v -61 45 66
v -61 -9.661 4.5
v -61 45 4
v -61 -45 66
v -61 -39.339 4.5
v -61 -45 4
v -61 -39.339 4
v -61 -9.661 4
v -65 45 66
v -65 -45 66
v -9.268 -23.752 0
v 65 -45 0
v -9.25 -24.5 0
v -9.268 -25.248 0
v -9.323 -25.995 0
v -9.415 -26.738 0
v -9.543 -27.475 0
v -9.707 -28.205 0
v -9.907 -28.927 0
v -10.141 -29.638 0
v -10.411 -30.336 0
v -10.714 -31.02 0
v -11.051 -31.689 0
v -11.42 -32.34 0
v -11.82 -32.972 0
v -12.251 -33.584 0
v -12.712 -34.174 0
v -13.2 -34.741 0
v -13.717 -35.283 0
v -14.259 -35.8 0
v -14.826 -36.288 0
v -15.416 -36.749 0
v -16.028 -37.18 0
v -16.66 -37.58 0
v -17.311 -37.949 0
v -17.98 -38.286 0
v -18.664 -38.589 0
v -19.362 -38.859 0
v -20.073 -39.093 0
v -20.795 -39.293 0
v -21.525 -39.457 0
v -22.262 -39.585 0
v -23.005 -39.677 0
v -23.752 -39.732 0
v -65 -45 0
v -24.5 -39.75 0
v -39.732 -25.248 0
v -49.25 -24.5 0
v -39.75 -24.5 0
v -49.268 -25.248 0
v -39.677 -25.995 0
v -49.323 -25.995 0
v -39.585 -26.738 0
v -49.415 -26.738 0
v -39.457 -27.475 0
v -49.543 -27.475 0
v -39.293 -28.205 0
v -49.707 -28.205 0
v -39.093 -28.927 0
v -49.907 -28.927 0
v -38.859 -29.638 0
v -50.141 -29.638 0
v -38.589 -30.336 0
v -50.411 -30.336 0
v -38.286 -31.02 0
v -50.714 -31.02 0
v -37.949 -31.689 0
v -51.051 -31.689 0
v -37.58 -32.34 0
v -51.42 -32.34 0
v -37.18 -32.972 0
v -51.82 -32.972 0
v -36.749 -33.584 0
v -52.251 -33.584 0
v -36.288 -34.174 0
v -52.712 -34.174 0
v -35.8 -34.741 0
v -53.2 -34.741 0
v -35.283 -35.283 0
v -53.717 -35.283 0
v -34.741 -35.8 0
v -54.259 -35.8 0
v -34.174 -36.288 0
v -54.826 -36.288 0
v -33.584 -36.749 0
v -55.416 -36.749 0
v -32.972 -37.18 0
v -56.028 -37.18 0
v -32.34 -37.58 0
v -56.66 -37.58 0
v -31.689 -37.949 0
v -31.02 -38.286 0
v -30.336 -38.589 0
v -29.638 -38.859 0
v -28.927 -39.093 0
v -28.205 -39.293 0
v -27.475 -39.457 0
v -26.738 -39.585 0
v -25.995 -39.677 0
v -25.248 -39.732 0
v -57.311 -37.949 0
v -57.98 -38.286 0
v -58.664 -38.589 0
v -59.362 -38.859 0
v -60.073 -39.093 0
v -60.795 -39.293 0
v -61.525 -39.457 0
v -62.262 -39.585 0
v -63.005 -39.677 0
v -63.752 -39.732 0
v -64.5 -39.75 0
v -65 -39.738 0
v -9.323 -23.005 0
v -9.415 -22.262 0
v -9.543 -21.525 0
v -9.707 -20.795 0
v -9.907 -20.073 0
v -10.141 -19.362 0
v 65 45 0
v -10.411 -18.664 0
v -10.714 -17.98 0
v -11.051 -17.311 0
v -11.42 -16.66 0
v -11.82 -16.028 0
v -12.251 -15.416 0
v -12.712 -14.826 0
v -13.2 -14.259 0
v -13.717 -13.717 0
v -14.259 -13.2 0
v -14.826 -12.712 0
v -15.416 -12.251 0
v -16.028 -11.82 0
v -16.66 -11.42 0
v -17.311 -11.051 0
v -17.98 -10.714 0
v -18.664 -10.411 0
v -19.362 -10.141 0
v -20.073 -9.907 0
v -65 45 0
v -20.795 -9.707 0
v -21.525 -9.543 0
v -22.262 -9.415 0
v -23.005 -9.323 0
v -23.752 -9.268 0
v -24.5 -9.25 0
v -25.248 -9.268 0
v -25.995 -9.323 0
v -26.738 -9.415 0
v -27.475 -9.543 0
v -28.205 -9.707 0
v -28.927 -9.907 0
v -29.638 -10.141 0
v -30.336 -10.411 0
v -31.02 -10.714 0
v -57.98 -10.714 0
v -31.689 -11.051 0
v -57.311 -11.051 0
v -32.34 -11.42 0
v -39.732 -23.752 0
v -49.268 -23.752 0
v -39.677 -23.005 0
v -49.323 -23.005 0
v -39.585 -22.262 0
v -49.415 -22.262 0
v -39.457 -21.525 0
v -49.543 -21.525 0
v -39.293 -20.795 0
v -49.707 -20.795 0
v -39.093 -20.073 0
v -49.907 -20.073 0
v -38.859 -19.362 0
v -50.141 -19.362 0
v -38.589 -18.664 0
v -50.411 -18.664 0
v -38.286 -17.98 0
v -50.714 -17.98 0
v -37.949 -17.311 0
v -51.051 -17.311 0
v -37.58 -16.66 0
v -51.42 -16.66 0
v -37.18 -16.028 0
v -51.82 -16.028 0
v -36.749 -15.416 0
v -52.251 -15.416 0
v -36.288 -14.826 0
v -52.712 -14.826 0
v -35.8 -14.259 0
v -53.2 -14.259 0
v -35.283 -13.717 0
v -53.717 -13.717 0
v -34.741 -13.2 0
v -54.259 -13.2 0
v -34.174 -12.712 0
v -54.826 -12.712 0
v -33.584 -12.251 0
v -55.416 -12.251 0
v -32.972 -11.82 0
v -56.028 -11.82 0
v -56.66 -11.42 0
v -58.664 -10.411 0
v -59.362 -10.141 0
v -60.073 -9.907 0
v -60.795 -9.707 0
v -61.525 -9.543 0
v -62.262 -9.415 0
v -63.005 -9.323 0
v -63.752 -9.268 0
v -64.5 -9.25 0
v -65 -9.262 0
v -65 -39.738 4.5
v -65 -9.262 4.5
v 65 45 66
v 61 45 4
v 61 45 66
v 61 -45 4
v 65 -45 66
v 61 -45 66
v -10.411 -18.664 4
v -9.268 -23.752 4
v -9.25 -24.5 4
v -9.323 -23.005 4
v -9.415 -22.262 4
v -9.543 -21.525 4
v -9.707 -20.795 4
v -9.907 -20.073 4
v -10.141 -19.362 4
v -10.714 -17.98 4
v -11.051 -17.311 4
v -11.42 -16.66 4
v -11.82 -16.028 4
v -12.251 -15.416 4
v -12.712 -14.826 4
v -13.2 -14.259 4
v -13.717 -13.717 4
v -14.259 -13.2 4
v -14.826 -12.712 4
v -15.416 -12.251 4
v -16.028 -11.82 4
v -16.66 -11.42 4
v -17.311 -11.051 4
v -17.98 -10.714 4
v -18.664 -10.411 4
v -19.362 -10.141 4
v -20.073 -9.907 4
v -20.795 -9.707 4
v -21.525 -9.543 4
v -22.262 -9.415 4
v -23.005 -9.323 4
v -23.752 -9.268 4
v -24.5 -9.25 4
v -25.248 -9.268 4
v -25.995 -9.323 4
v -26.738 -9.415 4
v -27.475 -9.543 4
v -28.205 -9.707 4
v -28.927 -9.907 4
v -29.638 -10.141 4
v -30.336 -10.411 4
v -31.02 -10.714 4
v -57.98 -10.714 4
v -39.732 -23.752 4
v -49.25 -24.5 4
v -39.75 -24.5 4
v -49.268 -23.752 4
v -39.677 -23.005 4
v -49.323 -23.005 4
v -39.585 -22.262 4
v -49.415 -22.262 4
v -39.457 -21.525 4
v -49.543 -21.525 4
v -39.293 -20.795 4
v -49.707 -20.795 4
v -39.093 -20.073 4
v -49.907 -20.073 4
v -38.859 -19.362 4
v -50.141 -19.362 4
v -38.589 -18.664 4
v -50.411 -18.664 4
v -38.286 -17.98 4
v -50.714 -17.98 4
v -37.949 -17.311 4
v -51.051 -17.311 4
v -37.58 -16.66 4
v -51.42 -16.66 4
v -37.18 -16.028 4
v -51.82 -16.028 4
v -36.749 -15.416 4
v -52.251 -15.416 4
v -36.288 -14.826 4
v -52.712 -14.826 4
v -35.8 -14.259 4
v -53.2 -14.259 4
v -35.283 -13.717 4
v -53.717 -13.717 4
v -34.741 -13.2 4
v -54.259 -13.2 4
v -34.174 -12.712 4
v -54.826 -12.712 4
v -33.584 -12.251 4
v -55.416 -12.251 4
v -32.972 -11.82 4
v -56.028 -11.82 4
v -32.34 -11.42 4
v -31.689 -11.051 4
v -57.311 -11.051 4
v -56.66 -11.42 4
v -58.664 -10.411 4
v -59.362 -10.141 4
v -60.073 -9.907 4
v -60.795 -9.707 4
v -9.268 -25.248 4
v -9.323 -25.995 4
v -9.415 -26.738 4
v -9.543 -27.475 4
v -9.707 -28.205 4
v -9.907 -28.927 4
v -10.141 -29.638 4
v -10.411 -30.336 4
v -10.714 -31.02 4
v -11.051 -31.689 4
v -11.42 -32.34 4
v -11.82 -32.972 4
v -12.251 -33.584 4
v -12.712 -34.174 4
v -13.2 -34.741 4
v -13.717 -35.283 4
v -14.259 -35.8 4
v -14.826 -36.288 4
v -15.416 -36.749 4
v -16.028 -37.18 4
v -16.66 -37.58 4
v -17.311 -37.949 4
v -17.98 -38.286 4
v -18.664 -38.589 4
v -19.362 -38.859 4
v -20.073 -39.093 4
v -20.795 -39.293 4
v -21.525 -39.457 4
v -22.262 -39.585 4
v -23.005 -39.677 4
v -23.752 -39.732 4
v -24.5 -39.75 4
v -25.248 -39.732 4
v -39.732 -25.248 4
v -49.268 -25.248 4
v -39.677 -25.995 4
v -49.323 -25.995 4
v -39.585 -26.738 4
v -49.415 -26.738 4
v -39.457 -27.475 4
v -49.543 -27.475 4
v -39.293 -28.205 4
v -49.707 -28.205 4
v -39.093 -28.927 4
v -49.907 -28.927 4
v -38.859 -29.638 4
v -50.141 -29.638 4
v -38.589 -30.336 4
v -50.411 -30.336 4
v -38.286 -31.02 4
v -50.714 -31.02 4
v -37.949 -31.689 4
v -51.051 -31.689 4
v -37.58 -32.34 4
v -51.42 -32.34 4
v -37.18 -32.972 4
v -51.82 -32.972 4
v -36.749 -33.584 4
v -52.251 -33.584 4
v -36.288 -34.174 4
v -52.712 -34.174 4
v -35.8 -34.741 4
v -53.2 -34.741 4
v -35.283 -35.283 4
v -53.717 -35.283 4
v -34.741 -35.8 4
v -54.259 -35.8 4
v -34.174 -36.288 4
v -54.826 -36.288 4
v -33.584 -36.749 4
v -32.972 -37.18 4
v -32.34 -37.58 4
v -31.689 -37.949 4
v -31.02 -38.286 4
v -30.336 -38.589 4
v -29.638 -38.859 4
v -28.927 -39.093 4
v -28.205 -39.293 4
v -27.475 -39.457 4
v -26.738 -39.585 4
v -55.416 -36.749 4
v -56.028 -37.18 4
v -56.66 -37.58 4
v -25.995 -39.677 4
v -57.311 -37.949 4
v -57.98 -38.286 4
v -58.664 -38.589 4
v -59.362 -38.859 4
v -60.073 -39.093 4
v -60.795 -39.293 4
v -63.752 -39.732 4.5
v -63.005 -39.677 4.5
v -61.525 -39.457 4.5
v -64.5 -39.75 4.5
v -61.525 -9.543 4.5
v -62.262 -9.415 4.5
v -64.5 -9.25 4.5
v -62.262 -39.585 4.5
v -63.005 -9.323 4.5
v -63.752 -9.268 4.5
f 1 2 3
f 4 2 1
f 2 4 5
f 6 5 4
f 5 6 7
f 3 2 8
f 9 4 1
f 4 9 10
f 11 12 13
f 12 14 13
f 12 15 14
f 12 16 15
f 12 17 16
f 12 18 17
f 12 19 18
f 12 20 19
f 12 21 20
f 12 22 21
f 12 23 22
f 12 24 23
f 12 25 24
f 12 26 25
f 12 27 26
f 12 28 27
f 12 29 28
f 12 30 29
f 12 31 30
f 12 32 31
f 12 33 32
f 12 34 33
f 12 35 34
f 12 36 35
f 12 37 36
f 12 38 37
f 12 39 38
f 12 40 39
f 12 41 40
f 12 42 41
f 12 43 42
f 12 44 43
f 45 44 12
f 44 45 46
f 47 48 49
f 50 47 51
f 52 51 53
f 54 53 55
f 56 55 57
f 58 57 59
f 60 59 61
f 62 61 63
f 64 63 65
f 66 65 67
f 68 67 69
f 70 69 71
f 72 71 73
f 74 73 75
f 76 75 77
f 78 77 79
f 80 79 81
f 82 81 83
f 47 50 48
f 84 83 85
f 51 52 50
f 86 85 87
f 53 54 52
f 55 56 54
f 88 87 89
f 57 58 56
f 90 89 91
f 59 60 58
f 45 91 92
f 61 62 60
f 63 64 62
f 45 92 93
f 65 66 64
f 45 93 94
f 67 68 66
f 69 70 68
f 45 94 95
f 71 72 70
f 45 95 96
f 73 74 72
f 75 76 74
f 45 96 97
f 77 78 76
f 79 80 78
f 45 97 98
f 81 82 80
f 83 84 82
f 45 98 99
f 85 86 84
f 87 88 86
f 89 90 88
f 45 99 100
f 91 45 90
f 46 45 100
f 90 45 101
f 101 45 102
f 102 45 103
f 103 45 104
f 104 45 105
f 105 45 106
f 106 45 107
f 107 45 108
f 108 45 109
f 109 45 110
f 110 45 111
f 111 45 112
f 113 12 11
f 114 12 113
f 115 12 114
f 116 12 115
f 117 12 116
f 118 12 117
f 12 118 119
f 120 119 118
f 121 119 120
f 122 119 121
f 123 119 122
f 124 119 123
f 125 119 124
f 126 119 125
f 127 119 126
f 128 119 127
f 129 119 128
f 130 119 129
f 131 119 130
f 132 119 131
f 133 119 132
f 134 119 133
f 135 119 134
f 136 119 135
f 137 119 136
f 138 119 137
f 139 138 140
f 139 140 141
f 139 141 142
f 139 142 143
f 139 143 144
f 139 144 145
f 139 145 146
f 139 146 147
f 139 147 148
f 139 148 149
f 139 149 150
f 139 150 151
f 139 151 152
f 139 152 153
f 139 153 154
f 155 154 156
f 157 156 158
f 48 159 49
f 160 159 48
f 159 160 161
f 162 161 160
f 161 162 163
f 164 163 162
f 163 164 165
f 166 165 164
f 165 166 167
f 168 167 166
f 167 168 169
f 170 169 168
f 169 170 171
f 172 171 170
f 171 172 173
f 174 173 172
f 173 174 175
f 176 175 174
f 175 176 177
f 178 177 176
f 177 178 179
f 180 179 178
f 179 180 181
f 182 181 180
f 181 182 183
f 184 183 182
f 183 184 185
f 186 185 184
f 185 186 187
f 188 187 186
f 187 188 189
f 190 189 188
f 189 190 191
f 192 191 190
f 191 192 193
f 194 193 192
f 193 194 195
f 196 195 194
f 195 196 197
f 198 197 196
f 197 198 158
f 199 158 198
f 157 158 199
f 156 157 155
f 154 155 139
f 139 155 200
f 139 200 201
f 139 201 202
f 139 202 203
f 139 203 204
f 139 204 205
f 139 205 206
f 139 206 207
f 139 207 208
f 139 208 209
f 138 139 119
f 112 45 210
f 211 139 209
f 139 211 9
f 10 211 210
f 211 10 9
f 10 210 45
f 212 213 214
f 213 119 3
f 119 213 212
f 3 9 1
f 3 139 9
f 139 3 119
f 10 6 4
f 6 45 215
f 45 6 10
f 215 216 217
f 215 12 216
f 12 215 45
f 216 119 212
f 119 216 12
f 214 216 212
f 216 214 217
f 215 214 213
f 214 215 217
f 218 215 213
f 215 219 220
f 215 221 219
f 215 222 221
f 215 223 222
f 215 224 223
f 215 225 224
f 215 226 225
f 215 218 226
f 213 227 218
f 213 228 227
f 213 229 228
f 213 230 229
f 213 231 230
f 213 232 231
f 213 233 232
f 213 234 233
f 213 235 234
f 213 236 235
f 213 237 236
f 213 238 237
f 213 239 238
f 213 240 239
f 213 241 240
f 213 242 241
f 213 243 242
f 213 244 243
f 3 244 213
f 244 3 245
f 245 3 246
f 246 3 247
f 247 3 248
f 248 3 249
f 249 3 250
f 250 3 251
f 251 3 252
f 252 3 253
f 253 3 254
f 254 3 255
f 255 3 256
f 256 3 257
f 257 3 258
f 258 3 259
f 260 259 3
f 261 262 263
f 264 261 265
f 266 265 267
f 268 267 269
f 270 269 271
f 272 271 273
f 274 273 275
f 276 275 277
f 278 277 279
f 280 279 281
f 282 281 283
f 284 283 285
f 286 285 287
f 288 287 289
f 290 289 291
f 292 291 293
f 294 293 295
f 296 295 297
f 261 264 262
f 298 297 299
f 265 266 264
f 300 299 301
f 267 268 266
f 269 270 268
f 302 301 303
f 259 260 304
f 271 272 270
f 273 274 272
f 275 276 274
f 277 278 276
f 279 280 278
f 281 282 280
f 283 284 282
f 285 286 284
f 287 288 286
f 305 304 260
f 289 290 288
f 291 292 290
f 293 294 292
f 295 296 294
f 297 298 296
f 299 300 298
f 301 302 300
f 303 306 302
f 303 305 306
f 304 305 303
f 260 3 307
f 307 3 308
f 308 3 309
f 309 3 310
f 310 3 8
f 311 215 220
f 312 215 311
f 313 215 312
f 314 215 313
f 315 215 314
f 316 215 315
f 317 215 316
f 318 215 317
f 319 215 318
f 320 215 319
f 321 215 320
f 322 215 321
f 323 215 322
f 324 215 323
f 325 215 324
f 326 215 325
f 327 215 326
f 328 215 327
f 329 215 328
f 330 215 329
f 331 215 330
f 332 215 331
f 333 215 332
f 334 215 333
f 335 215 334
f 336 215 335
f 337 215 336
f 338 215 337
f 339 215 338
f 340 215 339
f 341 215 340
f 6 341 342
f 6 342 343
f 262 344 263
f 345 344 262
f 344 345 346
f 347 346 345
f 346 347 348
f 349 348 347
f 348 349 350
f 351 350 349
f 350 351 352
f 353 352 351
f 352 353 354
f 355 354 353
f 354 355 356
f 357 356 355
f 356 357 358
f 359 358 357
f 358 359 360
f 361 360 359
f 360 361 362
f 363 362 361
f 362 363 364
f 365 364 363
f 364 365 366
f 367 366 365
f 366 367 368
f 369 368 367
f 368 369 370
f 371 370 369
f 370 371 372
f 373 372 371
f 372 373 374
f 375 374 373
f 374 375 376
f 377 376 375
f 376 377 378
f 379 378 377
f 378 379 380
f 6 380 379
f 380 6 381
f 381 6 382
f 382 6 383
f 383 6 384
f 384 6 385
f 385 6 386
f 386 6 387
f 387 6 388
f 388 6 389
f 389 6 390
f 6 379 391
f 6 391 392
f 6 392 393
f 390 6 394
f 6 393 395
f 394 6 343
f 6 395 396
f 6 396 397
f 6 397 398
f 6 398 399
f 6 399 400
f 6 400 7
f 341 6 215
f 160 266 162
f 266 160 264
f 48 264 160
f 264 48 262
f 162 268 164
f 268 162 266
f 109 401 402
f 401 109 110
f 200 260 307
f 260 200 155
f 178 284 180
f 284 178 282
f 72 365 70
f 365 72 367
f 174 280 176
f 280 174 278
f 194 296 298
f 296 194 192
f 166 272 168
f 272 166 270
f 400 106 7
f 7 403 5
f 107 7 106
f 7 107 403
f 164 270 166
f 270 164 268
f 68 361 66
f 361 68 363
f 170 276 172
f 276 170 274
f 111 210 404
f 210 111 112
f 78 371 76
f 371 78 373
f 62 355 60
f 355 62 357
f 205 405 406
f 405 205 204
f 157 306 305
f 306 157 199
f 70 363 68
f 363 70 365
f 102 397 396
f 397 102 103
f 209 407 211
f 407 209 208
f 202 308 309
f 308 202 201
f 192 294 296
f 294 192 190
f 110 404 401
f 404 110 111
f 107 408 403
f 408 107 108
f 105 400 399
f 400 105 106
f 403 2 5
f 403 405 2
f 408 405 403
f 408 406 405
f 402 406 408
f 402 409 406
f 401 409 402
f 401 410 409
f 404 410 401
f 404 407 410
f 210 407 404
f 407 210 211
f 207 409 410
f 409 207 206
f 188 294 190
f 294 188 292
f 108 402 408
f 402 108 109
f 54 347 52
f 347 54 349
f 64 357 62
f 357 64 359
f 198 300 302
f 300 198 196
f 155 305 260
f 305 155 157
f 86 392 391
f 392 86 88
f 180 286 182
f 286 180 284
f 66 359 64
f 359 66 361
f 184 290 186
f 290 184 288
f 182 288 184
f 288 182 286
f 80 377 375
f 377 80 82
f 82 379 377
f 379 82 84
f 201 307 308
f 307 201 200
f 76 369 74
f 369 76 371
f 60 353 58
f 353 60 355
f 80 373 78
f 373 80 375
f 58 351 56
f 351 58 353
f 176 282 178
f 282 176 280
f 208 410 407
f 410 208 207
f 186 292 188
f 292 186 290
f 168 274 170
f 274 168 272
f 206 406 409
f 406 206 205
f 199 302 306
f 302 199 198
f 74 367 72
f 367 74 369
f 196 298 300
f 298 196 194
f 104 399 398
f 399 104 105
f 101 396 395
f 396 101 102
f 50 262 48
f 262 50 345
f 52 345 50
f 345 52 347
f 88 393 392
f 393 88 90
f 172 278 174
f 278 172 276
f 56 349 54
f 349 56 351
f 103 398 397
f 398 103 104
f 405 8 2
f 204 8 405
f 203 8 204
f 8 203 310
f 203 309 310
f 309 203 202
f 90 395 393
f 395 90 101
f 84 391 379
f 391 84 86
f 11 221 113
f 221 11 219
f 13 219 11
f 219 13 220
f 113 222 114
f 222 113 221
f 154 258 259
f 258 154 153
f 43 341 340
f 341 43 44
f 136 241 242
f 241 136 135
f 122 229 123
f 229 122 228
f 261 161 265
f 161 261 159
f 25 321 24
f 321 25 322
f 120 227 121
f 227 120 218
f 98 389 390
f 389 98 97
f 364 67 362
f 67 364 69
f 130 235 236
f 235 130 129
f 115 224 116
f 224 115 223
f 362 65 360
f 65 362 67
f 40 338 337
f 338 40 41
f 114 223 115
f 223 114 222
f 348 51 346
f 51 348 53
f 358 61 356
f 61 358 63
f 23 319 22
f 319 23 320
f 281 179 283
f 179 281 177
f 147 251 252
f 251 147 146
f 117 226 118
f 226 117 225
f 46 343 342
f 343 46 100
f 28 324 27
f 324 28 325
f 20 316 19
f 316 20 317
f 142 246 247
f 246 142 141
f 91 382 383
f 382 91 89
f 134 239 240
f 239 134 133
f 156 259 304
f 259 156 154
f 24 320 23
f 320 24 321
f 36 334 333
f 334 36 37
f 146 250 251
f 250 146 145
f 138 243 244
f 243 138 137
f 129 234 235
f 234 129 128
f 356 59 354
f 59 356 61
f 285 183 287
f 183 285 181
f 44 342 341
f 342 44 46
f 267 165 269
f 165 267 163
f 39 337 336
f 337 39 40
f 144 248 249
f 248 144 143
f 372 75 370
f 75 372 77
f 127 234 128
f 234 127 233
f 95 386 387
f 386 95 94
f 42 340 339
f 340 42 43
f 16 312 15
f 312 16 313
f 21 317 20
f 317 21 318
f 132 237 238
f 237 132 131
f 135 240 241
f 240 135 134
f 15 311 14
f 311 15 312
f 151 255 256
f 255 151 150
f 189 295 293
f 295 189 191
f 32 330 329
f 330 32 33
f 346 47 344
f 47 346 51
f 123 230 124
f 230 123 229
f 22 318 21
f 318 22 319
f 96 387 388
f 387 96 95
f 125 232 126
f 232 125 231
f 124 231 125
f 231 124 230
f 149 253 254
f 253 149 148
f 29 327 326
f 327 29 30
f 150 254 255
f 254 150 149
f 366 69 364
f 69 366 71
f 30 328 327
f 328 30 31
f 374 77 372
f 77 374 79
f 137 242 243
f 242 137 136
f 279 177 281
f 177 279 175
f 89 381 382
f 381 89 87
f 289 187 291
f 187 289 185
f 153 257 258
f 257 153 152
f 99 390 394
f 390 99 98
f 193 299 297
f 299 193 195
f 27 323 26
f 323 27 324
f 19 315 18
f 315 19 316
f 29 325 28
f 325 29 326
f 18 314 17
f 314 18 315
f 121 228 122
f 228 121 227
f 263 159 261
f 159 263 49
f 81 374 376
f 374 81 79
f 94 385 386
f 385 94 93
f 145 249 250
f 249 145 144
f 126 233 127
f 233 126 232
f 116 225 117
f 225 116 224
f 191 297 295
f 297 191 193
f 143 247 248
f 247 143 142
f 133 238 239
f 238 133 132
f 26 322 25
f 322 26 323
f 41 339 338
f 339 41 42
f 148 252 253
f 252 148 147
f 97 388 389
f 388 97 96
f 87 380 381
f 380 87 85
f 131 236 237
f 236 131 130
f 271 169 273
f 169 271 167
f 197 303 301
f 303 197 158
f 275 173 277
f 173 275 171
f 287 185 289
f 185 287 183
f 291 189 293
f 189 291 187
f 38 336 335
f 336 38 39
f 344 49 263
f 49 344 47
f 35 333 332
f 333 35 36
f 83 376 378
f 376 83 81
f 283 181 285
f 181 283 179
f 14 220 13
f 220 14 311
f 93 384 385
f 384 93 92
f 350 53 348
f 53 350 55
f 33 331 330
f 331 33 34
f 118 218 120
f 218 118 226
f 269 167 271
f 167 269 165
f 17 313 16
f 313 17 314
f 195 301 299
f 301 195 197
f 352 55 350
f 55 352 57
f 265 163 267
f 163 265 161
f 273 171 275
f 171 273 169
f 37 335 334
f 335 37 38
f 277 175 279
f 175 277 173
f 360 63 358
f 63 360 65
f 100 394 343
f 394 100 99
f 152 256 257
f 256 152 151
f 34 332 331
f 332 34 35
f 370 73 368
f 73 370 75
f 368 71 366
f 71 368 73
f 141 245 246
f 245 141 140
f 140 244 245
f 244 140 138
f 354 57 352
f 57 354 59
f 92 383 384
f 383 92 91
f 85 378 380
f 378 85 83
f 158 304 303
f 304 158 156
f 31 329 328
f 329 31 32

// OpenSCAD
// Rack for six 50 mL conical (Falcon-type) tubes
// Print orientation: flat plate on bed, walls rising to z = 70
// Flip over after printing so the rack stands on the walls

// ---------- Parameters ----------
plate_x      = 130;   // plate length along X
plate_y      = 90;    // plate width along Y
plate_t      = 4;     // plate thickness (z = 0 to 4)

hole_d       = 30.5;  // through-hole diameter
hole_nx      = 3;     // holes along X
hole_ny      = 2;     // holes along Y
hole_pitch   = 40;    // centre-to-centre spacing (both directions)

wall_t       = 4;     // wall thickness (Y)
wall_h       = 70;    // wall top height (z)

eps          = 0.5;   // cutter overshoot past faces
$fn          = 128;   // curve resolution

// ---------- Derived ----------
wall_h_top = wall_h - plate_t;  // wall height above plate (66 mm)

// ---------- Model ----------
difference() {
    union() {
        // Flat plate on the bed
        translate([-plate_x/2, -plate_y/2, 0])
            cube([plate_x, plate_y, plate_t]);

        // Two solid walls along the long edges, flush with the plate
        for (sx = [-1, 1])
            translate([sx > 0 ? plate_x/2 - wall_t : -plate_x/2,
                       -plate_y/2, 0])
                cube([wall_t, plate_y, wall_h_top]);
    }

    // Through-holes in a 2 x 3 grid, centred on the plate
    for (i = [0 : hole_nx - 1])
        for (j = [0 : hole_ny - 1])
            translate([(i - (hole_nx - 1)/2) * hole_pitch - plate_x/2 + eps,
                       (j - (hole_ny - 1)/2) * hole_pitch - plate_y/2 + eps,
                       -eps])
                cylinder(d = hole_d, h = plate_t + 2 * eps);
}
